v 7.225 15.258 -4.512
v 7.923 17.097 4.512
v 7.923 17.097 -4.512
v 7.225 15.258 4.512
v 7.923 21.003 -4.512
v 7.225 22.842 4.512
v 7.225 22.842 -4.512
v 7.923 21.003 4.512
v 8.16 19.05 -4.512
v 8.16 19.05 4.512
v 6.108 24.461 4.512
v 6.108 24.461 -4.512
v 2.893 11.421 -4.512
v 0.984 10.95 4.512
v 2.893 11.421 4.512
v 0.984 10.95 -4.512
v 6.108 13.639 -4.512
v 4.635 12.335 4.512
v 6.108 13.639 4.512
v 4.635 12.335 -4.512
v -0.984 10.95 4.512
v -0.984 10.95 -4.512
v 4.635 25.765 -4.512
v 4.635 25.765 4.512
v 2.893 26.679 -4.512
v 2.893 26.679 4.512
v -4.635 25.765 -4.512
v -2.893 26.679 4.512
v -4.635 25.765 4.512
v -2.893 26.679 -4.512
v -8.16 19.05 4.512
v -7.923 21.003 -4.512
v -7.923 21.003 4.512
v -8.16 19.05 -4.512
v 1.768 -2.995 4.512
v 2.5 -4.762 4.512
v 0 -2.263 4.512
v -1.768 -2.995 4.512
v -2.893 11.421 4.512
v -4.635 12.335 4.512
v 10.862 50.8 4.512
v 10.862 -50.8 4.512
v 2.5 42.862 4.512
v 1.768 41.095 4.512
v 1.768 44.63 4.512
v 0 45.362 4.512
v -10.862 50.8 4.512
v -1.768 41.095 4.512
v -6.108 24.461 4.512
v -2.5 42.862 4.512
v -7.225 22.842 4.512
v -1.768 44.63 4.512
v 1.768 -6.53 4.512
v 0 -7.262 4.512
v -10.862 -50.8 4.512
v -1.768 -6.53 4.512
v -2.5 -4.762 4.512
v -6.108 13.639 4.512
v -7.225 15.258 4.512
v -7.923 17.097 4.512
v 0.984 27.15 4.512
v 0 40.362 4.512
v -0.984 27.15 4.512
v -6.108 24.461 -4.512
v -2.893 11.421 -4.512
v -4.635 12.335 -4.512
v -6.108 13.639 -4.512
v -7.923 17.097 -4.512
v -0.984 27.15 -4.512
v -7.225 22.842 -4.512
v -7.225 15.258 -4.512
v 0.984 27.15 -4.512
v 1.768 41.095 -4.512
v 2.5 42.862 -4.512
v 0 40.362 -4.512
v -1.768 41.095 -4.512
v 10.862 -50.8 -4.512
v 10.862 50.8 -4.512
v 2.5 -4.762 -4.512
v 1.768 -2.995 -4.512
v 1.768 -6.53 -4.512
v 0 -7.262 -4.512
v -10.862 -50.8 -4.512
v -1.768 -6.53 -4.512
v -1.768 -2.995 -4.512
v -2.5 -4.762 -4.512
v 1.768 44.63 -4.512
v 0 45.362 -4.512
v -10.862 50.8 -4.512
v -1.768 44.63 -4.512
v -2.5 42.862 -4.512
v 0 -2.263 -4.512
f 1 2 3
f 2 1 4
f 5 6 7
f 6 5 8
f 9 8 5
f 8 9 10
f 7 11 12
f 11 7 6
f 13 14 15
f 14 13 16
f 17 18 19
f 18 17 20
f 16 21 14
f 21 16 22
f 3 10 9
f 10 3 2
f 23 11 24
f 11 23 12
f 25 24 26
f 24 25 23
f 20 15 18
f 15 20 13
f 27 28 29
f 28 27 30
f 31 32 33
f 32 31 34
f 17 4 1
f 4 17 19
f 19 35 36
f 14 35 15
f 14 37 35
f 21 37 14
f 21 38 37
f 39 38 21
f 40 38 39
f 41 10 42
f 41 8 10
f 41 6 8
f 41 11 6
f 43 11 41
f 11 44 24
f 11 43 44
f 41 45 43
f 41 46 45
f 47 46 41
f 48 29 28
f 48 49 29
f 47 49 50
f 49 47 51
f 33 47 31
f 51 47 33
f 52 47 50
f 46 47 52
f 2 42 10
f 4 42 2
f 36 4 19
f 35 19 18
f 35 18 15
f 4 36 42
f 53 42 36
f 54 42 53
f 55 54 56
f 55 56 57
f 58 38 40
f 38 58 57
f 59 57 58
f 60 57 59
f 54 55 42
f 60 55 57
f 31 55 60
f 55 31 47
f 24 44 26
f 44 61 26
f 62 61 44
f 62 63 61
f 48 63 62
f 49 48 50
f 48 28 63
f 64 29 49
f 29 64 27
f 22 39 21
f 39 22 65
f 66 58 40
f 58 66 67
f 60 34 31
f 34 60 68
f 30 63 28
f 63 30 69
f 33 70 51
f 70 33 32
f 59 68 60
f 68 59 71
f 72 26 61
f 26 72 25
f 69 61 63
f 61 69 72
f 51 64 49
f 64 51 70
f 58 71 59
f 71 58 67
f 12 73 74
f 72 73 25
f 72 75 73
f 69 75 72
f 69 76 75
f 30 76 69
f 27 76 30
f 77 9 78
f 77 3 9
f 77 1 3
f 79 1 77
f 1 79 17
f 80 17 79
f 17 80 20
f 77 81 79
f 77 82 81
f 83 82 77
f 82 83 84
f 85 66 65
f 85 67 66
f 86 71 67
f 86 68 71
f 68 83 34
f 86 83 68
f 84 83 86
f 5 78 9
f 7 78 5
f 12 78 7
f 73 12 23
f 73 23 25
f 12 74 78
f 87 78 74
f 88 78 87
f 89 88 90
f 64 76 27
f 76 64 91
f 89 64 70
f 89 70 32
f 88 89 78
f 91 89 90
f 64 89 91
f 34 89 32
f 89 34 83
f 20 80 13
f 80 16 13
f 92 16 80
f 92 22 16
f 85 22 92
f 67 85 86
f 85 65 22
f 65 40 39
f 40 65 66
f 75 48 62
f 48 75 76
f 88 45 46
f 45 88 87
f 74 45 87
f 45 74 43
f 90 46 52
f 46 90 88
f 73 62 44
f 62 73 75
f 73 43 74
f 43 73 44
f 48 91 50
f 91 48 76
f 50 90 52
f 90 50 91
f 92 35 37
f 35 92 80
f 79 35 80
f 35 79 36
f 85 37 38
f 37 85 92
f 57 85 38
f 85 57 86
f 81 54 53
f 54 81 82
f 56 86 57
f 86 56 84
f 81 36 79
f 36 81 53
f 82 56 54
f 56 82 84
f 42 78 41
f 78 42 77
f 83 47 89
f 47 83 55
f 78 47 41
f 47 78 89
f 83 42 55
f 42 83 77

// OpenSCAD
// Aluminum tubing insert to support a 1/2" hex shaft
// Designed to work with the AndyMark am-0096a hub
// http://www.andymark.com/Hub-p/am-0096a.htm

// adjust the wallSize, shaft diameter and length as you see fit

use <MCAD/regular_shapes.scad>

in = 25.4;  // makes it easier to read the measurements

tubeSize = 1*in;   //outer size of the tube
wallSize = 1/16*in; //wall thickness
shaftDiam = 1/2 * in; //nominal diameter of the shaft (flat to flat)
holes = (1.875)*in;  //distance between bolt holes
length = 3*in;     //overall length of the shaft

module hex_shaft_support(tubeSize=[in,in], wallSize, shaftDiam, holes, length, shift=0) {
	innerW = tubeSize[0]-(2*wallSize)-0.5; //make it .5mm smaller
	innerH = tubeSize[1]-(2*wallSize)-0.5; //make it .5mm smaller
	hexDiam = 2*tan(30)*shaftDiam;     //the diamiter of the points of the hex shaft, it's only 1/2" to the flat sides
	difference() {
		cube([innerW, length, innerH], center=true);
		translate([0, shift, 0]) {
			rotate([0, 0, 0]) cylinder(d=0.5+hexDiam, h=innerH, center=true, $fn=26);
			translate([0, holes/2, 0]) cylinder(d=5, h=innerH, center=true);
			translate([0, -holes/2, 0]) cylinder(d=5, h=innerH, center=true);
		}
	}
}


module scissor_center(tubeSize=[in,in], wallSize, shaftDiam, holes, length, shift=0) {
	innerW = tubeSize[0]-(2*wallSize)-0.5; //make it .5mm smaller
	innerH = tubeSize[1]-(2*wallSize)-0.5; //make it .5mm smaller
	hexDiam = 2*tan(30)*shaftDiam;     //the diamiter of the points of the hex shaft, it's only 1/2" to the flat sides
	difference() {
		cube([innerW, length, innerH], center=true);
		translate([0, shift, 0]) {
			rotate([0, 0, 0]) cylinder(d=.25*in, h=innerH, center=true, $fn=26);
		//	translate([0, holes/2, 0]) cylinder(d=5, h=innerH, center=true);
		//	translate([0, -holes/2, 0]) cylinder(d=5, h=innerH, center=true);
		}
	}
}

//hex_shaft_support(1*in, in*1/16, in*1/2, in*1.875, 3*in);

hex_shaft_support([1*in, in*1/2], in*1/16, 1+in*1/2, in*1.875, 4*in, .75*in);
//scissor_center([1*in, in*1/2], in*1/16, 1+in*1/2, in*1.875, 1*in, 0*in);
